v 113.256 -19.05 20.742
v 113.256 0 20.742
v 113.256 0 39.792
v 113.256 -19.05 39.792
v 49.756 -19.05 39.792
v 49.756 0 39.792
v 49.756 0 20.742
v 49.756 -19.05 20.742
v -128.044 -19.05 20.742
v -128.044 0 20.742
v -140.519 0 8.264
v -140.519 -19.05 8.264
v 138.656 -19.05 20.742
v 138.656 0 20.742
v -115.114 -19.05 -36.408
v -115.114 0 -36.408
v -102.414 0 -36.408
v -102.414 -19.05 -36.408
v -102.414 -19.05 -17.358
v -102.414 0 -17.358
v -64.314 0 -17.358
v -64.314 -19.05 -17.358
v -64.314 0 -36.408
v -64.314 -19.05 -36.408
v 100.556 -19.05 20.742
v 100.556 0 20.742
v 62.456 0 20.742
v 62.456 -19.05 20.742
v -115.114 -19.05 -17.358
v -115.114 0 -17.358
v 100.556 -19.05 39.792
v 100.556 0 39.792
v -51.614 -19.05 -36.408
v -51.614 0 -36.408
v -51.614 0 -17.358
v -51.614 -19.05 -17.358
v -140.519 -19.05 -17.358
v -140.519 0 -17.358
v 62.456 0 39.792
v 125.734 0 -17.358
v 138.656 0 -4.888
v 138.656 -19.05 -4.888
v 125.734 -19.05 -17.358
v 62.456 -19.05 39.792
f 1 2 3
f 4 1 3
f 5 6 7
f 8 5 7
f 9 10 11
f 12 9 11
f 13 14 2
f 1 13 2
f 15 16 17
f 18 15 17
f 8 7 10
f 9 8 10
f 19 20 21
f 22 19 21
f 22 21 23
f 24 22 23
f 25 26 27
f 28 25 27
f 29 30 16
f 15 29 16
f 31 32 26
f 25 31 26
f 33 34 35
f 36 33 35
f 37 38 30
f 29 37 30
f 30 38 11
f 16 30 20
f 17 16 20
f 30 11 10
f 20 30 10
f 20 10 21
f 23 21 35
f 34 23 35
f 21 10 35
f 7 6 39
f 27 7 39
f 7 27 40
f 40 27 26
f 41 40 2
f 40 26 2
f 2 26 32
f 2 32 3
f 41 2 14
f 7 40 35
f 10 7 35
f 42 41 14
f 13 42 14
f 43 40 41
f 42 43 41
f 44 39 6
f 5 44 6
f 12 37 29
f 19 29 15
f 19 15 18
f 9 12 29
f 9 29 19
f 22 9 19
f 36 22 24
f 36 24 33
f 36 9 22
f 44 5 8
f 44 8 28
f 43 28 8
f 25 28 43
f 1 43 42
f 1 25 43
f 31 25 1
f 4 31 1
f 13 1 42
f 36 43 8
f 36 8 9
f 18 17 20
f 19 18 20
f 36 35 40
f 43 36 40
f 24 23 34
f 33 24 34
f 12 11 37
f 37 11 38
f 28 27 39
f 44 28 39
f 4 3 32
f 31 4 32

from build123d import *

# Parameters (mm, degrees)
F1_DEPTH = 19.05


# Not quite as in the source:
# - a feature names something its author has since deleted; it is built from what else it names


with BuildPart() as f1:
    # F0 (on Front) → F1 (new body)
    with BuildSketch(Plane.XZ):
        Polygon((-140.5185023113, -17.3581795608), (-115.1141719677, -17.3581795608), (-115.1141719677, -36.4081795608), (-102.4141719677, -36.4081795608), (-102.4141719677, -17.3581795608), (-64.3141719677, -17.3581795608), (-64.3141719677, -36.4081795608), (-51.6141719677, -36.4081795608), (-51.6141719677, -17.3581795608), (125.7340388179, -17.3581795608), (138.656257718, -4.8882621778), (138.656257718, 20.7418204392), (113.256257718, 20.7418204392), (113.256257718, 39.7918204392), (100.556257718, 39.7918204392), (100.556257718, 20.7418204392), (62.456257718, 20.7418204392), (62.456257718, 39.7918204392), (49.756257718, 39.7918204392), (49.756257718, 20.7418204392), (-128.043742282, 20.7418204392), (-140.5185023113, 8.2640567404), align=None)
    extrude(amount=F1_DEPTH)


solid = f1.part
